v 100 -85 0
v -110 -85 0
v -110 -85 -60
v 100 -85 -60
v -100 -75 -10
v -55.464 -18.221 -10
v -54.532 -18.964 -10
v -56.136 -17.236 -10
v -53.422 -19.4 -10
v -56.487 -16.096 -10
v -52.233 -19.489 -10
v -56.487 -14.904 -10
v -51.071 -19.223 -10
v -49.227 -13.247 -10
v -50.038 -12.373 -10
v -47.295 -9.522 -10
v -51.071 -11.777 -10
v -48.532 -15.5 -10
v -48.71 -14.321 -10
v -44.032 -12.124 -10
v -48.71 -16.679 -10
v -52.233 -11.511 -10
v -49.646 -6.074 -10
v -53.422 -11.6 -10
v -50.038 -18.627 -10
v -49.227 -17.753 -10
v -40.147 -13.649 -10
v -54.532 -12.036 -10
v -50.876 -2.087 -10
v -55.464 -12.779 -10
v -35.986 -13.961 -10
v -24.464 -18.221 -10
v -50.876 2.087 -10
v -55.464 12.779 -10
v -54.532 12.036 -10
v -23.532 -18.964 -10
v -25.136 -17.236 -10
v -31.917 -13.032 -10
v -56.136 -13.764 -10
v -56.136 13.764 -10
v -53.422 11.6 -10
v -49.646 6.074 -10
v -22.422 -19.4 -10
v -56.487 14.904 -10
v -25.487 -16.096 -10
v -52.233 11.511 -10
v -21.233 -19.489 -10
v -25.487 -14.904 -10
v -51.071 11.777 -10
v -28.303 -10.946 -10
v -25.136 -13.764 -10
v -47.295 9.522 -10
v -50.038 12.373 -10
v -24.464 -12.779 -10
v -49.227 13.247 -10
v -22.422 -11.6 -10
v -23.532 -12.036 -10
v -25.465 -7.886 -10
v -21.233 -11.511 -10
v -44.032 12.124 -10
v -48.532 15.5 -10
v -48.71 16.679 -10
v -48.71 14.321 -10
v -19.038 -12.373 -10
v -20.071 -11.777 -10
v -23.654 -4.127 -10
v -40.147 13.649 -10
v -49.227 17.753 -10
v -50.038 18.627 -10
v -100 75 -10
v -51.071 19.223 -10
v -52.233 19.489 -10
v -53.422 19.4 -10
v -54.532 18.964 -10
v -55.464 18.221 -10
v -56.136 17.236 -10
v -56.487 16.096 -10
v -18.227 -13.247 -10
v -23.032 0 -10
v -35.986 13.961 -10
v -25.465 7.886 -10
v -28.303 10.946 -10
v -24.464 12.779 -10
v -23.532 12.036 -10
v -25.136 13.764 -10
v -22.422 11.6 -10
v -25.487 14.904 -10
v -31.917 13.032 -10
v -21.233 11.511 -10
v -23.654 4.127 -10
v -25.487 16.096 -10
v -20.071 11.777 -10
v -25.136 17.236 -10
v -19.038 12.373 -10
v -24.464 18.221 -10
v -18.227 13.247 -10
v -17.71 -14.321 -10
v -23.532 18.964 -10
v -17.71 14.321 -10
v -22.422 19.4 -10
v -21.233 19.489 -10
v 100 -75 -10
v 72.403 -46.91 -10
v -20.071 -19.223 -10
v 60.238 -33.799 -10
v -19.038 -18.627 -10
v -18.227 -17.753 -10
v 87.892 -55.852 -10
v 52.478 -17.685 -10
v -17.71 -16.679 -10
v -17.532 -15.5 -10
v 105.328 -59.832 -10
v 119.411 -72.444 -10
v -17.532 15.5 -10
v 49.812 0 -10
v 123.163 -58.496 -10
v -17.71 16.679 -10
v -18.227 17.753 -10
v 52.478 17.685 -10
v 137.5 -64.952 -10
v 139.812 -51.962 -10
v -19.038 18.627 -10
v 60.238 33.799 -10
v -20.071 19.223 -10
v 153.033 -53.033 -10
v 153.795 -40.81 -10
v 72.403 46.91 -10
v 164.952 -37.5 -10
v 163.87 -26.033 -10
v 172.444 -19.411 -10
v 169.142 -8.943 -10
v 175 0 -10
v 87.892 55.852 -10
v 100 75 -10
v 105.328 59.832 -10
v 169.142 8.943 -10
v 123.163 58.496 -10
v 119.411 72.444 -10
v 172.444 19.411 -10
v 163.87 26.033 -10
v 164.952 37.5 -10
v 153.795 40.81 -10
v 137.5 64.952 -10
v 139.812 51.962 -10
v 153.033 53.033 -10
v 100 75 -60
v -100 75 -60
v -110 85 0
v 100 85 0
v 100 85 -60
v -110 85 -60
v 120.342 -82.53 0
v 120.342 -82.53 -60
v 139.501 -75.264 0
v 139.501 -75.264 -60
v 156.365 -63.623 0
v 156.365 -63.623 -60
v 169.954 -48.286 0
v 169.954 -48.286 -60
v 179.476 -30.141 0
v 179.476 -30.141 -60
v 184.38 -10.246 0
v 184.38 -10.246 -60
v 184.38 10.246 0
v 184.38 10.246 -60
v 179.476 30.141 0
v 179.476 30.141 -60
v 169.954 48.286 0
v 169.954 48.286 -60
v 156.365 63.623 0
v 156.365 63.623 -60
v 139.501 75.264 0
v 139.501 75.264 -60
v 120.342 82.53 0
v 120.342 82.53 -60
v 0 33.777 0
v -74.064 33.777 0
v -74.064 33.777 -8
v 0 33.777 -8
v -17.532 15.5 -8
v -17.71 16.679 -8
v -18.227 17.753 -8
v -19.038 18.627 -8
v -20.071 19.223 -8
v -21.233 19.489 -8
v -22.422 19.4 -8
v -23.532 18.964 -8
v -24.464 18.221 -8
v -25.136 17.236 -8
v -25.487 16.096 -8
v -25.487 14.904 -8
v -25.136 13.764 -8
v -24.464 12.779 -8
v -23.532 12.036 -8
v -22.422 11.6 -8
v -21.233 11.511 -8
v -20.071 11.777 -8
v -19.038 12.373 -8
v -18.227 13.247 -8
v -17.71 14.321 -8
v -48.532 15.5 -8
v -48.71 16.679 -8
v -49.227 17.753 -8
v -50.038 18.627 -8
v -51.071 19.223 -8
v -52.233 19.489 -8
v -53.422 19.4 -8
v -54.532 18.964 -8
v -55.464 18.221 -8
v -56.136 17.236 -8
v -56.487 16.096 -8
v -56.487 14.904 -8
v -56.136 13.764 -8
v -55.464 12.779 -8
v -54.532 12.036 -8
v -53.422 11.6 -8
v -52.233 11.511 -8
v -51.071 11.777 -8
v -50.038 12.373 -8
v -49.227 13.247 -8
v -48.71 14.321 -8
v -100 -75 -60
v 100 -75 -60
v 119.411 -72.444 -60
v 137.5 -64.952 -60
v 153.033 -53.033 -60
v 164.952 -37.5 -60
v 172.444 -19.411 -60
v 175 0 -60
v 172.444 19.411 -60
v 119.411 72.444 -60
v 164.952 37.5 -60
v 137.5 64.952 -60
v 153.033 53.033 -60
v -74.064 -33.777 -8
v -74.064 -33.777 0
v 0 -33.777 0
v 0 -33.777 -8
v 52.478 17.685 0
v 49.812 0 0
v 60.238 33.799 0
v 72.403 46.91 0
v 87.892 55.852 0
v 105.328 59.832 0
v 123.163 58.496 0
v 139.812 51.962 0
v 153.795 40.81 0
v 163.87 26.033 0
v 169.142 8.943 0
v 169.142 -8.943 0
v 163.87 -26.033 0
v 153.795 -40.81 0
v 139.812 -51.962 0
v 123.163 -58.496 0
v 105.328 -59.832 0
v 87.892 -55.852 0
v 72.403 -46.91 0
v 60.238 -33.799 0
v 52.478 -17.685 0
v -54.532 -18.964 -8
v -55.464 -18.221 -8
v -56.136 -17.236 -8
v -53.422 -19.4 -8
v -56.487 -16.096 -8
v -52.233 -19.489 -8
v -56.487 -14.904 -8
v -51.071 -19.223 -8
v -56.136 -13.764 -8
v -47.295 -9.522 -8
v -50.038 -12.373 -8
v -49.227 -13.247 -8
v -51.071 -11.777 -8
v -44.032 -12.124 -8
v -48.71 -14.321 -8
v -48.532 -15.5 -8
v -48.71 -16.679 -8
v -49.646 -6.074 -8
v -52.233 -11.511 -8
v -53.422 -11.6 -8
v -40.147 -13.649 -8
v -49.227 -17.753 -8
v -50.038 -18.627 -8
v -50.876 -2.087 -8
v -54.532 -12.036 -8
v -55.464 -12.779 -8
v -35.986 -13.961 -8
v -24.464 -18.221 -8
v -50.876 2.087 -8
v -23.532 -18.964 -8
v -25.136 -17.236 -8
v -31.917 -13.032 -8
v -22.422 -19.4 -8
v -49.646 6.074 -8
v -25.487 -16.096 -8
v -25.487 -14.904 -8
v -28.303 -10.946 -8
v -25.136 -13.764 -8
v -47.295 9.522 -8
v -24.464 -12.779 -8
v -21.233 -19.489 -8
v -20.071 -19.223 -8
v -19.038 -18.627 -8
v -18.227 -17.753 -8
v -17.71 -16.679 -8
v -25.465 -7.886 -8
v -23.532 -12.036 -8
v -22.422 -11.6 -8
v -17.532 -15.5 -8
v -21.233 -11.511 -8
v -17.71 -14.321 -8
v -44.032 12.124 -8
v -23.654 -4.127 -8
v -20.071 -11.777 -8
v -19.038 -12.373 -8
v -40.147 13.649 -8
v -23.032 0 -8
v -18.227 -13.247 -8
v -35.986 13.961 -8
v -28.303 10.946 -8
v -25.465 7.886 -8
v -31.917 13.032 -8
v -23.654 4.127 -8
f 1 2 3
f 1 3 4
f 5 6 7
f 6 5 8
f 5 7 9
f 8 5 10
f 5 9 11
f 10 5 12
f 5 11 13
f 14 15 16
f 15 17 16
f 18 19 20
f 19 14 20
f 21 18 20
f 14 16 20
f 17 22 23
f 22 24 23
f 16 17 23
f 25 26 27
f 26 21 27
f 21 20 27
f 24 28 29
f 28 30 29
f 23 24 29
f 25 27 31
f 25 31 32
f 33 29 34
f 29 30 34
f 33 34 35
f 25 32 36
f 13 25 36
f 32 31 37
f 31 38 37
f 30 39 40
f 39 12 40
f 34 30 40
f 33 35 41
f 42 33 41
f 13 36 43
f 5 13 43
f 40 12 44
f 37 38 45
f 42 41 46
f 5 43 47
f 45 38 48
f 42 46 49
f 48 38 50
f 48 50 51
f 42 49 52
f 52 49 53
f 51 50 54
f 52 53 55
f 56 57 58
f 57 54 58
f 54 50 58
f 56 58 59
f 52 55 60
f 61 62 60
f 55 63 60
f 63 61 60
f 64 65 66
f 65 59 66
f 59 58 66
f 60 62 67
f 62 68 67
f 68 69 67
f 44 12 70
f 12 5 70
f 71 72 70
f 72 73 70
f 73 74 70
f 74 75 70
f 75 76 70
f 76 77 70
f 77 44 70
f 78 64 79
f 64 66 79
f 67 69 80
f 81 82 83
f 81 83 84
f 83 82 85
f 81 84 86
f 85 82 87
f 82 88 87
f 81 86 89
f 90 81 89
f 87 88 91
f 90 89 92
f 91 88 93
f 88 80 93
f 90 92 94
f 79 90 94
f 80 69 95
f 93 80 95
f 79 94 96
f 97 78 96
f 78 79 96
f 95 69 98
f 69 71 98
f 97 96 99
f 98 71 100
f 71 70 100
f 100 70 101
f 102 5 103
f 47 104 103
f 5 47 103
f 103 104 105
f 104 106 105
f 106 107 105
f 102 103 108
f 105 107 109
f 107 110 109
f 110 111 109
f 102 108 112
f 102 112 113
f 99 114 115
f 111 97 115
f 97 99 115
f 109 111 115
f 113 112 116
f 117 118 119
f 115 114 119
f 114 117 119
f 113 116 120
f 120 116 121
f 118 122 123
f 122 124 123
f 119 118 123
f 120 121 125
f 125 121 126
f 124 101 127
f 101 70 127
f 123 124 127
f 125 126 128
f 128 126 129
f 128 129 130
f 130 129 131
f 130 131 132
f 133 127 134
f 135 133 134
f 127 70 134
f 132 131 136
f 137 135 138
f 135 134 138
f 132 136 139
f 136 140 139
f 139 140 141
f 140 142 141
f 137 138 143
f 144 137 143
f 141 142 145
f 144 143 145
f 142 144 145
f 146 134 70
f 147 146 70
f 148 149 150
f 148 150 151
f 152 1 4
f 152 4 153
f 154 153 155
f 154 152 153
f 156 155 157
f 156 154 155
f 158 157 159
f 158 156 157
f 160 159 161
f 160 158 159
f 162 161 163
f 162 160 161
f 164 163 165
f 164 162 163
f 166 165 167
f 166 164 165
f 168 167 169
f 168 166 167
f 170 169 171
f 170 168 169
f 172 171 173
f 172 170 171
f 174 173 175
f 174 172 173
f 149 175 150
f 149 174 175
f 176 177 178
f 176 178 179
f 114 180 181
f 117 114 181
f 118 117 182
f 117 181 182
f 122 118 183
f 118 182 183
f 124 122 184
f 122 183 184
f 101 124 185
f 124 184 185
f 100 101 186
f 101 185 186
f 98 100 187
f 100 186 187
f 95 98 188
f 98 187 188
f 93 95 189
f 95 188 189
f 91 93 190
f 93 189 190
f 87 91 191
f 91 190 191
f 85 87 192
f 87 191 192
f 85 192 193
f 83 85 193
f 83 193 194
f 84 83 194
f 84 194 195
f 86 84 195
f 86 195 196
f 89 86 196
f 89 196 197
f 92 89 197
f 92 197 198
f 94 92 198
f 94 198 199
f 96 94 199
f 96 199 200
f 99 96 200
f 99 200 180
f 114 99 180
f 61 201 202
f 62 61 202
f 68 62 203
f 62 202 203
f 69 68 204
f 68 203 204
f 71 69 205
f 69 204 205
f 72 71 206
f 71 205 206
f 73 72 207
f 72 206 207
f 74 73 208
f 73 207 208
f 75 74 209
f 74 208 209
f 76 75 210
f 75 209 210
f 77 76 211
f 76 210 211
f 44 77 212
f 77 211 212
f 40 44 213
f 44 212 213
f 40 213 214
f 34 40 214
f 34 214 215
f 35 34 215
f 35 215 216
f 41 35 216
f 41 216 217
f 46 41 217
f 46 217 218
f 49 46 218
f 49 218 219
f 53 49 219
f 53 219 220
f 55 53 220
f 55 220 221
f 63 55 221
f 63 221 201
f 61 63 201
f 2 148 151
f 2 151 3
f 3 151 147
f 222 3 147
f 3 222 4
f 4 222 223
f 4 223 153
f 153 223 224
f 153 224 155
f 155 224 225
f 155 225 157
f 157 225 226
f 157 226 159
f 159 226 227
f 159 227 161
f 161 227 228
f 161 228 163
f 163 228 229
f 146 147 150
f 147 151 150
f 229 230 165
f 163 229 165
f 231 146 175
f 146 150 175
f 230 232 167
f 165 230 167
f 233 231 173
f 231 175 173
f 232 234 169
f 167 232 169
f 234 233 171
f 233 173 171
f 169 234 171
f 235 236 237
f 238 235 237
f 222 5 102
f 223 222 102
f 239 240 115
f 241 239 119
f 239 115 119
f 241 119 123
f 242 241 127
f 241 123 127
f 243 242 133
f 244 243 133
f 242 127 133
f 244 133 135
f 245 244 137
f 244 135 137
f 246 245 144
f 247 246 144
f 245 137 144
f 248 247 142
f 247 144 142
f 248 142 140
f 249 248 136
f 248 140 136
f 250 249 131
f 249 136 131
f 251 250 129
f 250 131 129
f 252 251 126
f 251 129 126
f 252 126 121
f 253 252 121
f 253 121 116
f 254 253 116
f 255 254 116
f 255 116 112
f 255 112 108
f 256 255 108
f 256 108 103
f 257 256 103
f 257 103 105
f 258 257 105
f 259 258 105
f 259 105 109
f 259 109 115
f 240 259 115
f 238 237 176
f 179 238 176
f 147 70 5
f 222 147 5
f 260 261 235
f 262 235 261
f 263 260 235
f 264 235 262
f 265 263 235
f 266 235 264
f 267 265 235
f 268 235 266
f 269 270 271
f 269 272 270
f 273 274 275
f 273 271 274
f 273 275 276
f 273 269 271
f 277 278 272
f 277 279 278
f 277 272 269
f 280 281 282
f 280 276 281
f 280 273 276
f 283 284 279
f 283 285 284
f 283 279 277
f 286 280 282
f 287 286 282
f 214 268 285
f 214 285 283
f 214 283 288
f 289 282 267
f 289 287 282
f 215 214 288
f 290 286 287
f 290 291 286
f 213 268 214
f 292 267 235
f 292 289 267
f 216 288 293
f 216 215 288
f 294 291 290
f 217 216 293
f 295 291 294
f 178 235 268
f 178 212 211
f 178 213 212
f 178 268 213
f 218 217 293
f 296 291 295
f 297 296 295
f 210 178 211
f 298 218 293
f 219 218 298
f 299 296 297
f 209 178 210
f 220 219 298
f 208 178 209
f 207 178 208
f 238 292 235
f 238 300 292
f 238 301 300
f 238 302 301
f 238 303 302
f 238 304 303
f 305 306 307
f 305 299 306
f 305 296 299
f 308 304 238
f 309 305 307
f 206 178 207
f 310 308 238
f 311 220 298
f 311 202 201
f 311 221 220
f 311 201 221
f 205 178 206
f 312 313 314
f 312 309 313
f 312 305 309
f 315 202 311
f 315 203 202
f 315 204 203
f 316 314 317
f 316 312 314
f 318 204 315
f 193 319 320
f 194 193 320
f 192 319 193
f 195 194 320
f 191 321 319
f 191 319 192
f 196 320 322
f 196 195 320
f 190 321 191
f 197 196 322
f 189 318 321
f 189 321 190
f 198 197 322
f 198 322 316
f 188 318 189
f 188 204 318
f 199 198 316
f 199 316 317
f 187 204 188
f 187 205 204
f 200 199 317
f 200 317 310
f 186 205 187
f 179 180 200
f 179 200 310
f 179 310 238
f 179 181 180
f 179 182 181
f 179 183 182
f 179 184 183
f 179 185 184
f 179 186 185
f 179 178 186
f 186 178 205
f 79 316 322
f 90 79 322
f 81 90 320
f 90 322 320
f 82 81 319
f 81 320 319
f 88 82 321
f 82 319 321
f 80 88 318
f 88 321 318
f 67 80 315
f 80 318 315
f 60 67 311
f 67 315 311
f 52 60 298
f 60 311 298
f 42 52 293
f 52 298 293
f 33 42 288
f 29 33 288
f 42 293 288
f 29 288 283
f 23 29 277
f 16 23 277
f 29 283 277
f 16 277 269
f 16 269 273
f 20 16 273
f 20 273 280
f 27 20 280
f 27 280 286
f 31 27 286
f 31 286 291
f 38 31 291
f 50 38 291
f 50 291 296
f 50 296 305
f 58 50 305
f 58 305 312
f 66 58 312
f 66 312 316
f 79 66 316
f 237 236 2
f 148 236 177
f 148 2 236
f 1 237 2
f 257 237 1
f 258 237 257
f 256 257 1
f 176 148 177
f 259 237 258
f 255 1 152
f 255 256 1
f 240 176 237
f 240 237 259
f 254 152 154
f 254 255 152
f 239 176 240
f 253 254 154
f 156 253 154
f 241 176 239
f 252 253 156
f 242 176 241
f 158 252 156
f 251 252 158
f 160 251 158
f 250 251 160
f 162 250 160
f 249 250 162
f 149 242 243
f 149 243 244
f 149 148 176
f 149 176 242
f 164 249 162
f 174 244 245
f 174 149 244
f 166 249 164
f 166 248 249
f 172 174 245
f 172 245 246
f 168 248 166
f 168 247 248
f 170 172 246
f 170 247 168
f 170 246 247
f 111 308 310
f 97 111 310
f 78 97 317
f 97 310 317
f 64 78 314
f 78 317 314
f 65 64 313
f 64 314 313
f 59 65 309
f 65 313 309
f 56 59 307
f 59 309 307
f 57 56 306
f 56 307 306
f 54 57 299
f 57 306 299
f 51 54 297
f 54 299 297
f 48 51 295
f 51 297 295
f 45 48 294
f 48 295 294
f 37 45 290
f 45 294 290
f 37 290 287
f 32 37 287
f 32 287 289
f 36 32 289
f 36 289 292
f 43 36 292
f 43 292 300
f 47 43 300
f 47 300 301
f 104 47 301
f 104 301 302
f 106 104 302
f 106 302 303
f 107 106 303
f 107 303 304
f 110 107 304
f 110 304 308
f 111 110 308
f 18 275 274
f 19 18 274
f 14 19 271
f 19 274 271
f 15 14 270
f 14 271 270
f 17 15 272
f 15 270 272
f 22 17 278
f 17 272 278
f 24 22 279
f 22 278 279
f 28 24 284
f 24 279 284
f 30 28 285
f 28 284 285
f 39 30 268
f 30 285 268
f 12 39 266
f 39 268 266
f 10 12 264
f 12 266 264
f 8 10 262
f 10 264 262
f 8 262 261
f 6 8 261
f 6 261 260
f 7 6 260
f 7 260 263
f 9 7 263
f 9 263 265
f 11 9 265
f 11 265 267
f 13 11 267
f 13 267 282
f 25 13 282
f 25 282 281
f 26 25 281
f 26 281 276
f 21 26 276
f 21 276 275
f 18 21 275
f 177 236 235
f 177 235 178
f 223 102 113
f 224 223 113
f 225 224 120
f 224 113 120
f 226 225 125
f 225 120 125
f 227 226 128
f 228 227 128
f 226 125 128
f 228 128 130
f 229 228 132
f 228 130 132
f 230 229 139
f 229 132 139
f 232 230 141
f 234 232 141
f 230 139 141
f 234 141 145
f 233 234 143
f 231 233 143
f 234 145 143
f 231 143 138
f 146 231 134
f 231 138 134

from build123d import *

# Parameters (mm, degrees)
EXTRUDE_THIN1_DEPTH = 60
BOSS_EXTRUDE1_DEPTH = 10
SKETCH2_R           = 60
CUT_EXTRUDE1_DEPTH  = 210.642552932
SKETCH3_W           = 74.064232883
SKETCH3_H           = 67.55464171
SKETCH3_R           = 14
CUT_EXTRUDE2_DEPTH  = 8
SKETCH3_2_R         = 14
CUT_EXTRUDE3_DEPTH  = 213.249852768
SKETCH7_R           = 4
CUT_EXTRUDE4_DEPTH  = 211.128532094


with BuildPart() as part:
    # Sketch1 → Extrude-Thin1 (new body)
    with BuildSketch(Plane.XY):
        with BuildLine():
            Line((100, 85), (-110, 85))
            Line((-110, 85), (-110, -85))
            Line((-110, -85), (100, -85))
            ThreePointArc((100, -85), (185, 0), (100, 85))
        make_face()
        with BuildLine():
            Line((100, 75), (-100, 75))
            Line((-100, 75), (-100, -75))
            Line((-100, -75), (100, -75))
            ThreePointArc((100, -75), (175, 0), (100, 75))
        make_face(mode=Mode.SUBTRACT)
    extrude(amount=-EXTRUDE_THIN1_DEPTH)

    # Sketch1<2> → Boss-Extrude1 (add)
    with BuildSketch(Plane.XY):
        with BuildLine():
            Line((-100, -75), (100, -75))
            ThreePointArc((100, -75), (175, 0), (100, 75))
            Line((100, 75), (-100, 75))
            Line((-100, 75), (-100, -75))
        make_face()
    extrude(amount=-BOSS_EXTRUDE1_DEPTH)

    # Sketch2 → Cut-Extrude1 (cut, through all)
    with BuildSketch(Plane(origin=(0, 0, -10), x_dir=(-1, 0, 0), z_dir=(0, 0, -1))):
        with Locations((-109.812010845, 0)):
            Circle(SKETCH2_R)
    extrude(amount=-CUT_EXTRUDE1_DEPTH, mode=Mode.SUBTRACT)

    # Sketch3 → Cut-Extrude2 (cut)
    with BuildSketch(Plane.XY):
        with Locations((-37.032116442, 0)):
            Rectangle(SKETCH3_W, SKETCH3_H)
        with Locations((-37.032116441, 0)):
            Circle(SKETCH3_R, mode=Mode.SUBTRACT)
    extrude(amount=-CUT_EXTRUDE2_DEPTH, mode=Mode.SUBTRACT)

    # Sketch3<2> → Cut-Extrude3 (cut, through all)
    with BuildSketch(Plane.XY):
        with Locations((-37.032116441, 0)):
            Circle(SKETCH3_2_R)
    extrude(amount=-CUT_EXTRUDE3_DEPTH, mode=Mode.SUBTRACT)

    # Sketch7 → Cut-Extrude4 (cut, through all)
    with BuildSketch(Plane.XY.offset(-8)):
        with Locations((-52.532116441, 15.5)):
            Circle(SKETCH7_R)
        with Locations((-21.532116441, 15.5)):
            Circle(SKETCH7_R)
        with Locations((-21.532116441, -15.5)):
            Circle(SKETCH7_R)
        with Locations((-52.532116441, -15.5)):
            Circle(SKETCH7_R)
    extrude(amount=-CUT_EXTRUDE4_DEPTH, mode=Mode.SUBTRACT)


solid = part.part
